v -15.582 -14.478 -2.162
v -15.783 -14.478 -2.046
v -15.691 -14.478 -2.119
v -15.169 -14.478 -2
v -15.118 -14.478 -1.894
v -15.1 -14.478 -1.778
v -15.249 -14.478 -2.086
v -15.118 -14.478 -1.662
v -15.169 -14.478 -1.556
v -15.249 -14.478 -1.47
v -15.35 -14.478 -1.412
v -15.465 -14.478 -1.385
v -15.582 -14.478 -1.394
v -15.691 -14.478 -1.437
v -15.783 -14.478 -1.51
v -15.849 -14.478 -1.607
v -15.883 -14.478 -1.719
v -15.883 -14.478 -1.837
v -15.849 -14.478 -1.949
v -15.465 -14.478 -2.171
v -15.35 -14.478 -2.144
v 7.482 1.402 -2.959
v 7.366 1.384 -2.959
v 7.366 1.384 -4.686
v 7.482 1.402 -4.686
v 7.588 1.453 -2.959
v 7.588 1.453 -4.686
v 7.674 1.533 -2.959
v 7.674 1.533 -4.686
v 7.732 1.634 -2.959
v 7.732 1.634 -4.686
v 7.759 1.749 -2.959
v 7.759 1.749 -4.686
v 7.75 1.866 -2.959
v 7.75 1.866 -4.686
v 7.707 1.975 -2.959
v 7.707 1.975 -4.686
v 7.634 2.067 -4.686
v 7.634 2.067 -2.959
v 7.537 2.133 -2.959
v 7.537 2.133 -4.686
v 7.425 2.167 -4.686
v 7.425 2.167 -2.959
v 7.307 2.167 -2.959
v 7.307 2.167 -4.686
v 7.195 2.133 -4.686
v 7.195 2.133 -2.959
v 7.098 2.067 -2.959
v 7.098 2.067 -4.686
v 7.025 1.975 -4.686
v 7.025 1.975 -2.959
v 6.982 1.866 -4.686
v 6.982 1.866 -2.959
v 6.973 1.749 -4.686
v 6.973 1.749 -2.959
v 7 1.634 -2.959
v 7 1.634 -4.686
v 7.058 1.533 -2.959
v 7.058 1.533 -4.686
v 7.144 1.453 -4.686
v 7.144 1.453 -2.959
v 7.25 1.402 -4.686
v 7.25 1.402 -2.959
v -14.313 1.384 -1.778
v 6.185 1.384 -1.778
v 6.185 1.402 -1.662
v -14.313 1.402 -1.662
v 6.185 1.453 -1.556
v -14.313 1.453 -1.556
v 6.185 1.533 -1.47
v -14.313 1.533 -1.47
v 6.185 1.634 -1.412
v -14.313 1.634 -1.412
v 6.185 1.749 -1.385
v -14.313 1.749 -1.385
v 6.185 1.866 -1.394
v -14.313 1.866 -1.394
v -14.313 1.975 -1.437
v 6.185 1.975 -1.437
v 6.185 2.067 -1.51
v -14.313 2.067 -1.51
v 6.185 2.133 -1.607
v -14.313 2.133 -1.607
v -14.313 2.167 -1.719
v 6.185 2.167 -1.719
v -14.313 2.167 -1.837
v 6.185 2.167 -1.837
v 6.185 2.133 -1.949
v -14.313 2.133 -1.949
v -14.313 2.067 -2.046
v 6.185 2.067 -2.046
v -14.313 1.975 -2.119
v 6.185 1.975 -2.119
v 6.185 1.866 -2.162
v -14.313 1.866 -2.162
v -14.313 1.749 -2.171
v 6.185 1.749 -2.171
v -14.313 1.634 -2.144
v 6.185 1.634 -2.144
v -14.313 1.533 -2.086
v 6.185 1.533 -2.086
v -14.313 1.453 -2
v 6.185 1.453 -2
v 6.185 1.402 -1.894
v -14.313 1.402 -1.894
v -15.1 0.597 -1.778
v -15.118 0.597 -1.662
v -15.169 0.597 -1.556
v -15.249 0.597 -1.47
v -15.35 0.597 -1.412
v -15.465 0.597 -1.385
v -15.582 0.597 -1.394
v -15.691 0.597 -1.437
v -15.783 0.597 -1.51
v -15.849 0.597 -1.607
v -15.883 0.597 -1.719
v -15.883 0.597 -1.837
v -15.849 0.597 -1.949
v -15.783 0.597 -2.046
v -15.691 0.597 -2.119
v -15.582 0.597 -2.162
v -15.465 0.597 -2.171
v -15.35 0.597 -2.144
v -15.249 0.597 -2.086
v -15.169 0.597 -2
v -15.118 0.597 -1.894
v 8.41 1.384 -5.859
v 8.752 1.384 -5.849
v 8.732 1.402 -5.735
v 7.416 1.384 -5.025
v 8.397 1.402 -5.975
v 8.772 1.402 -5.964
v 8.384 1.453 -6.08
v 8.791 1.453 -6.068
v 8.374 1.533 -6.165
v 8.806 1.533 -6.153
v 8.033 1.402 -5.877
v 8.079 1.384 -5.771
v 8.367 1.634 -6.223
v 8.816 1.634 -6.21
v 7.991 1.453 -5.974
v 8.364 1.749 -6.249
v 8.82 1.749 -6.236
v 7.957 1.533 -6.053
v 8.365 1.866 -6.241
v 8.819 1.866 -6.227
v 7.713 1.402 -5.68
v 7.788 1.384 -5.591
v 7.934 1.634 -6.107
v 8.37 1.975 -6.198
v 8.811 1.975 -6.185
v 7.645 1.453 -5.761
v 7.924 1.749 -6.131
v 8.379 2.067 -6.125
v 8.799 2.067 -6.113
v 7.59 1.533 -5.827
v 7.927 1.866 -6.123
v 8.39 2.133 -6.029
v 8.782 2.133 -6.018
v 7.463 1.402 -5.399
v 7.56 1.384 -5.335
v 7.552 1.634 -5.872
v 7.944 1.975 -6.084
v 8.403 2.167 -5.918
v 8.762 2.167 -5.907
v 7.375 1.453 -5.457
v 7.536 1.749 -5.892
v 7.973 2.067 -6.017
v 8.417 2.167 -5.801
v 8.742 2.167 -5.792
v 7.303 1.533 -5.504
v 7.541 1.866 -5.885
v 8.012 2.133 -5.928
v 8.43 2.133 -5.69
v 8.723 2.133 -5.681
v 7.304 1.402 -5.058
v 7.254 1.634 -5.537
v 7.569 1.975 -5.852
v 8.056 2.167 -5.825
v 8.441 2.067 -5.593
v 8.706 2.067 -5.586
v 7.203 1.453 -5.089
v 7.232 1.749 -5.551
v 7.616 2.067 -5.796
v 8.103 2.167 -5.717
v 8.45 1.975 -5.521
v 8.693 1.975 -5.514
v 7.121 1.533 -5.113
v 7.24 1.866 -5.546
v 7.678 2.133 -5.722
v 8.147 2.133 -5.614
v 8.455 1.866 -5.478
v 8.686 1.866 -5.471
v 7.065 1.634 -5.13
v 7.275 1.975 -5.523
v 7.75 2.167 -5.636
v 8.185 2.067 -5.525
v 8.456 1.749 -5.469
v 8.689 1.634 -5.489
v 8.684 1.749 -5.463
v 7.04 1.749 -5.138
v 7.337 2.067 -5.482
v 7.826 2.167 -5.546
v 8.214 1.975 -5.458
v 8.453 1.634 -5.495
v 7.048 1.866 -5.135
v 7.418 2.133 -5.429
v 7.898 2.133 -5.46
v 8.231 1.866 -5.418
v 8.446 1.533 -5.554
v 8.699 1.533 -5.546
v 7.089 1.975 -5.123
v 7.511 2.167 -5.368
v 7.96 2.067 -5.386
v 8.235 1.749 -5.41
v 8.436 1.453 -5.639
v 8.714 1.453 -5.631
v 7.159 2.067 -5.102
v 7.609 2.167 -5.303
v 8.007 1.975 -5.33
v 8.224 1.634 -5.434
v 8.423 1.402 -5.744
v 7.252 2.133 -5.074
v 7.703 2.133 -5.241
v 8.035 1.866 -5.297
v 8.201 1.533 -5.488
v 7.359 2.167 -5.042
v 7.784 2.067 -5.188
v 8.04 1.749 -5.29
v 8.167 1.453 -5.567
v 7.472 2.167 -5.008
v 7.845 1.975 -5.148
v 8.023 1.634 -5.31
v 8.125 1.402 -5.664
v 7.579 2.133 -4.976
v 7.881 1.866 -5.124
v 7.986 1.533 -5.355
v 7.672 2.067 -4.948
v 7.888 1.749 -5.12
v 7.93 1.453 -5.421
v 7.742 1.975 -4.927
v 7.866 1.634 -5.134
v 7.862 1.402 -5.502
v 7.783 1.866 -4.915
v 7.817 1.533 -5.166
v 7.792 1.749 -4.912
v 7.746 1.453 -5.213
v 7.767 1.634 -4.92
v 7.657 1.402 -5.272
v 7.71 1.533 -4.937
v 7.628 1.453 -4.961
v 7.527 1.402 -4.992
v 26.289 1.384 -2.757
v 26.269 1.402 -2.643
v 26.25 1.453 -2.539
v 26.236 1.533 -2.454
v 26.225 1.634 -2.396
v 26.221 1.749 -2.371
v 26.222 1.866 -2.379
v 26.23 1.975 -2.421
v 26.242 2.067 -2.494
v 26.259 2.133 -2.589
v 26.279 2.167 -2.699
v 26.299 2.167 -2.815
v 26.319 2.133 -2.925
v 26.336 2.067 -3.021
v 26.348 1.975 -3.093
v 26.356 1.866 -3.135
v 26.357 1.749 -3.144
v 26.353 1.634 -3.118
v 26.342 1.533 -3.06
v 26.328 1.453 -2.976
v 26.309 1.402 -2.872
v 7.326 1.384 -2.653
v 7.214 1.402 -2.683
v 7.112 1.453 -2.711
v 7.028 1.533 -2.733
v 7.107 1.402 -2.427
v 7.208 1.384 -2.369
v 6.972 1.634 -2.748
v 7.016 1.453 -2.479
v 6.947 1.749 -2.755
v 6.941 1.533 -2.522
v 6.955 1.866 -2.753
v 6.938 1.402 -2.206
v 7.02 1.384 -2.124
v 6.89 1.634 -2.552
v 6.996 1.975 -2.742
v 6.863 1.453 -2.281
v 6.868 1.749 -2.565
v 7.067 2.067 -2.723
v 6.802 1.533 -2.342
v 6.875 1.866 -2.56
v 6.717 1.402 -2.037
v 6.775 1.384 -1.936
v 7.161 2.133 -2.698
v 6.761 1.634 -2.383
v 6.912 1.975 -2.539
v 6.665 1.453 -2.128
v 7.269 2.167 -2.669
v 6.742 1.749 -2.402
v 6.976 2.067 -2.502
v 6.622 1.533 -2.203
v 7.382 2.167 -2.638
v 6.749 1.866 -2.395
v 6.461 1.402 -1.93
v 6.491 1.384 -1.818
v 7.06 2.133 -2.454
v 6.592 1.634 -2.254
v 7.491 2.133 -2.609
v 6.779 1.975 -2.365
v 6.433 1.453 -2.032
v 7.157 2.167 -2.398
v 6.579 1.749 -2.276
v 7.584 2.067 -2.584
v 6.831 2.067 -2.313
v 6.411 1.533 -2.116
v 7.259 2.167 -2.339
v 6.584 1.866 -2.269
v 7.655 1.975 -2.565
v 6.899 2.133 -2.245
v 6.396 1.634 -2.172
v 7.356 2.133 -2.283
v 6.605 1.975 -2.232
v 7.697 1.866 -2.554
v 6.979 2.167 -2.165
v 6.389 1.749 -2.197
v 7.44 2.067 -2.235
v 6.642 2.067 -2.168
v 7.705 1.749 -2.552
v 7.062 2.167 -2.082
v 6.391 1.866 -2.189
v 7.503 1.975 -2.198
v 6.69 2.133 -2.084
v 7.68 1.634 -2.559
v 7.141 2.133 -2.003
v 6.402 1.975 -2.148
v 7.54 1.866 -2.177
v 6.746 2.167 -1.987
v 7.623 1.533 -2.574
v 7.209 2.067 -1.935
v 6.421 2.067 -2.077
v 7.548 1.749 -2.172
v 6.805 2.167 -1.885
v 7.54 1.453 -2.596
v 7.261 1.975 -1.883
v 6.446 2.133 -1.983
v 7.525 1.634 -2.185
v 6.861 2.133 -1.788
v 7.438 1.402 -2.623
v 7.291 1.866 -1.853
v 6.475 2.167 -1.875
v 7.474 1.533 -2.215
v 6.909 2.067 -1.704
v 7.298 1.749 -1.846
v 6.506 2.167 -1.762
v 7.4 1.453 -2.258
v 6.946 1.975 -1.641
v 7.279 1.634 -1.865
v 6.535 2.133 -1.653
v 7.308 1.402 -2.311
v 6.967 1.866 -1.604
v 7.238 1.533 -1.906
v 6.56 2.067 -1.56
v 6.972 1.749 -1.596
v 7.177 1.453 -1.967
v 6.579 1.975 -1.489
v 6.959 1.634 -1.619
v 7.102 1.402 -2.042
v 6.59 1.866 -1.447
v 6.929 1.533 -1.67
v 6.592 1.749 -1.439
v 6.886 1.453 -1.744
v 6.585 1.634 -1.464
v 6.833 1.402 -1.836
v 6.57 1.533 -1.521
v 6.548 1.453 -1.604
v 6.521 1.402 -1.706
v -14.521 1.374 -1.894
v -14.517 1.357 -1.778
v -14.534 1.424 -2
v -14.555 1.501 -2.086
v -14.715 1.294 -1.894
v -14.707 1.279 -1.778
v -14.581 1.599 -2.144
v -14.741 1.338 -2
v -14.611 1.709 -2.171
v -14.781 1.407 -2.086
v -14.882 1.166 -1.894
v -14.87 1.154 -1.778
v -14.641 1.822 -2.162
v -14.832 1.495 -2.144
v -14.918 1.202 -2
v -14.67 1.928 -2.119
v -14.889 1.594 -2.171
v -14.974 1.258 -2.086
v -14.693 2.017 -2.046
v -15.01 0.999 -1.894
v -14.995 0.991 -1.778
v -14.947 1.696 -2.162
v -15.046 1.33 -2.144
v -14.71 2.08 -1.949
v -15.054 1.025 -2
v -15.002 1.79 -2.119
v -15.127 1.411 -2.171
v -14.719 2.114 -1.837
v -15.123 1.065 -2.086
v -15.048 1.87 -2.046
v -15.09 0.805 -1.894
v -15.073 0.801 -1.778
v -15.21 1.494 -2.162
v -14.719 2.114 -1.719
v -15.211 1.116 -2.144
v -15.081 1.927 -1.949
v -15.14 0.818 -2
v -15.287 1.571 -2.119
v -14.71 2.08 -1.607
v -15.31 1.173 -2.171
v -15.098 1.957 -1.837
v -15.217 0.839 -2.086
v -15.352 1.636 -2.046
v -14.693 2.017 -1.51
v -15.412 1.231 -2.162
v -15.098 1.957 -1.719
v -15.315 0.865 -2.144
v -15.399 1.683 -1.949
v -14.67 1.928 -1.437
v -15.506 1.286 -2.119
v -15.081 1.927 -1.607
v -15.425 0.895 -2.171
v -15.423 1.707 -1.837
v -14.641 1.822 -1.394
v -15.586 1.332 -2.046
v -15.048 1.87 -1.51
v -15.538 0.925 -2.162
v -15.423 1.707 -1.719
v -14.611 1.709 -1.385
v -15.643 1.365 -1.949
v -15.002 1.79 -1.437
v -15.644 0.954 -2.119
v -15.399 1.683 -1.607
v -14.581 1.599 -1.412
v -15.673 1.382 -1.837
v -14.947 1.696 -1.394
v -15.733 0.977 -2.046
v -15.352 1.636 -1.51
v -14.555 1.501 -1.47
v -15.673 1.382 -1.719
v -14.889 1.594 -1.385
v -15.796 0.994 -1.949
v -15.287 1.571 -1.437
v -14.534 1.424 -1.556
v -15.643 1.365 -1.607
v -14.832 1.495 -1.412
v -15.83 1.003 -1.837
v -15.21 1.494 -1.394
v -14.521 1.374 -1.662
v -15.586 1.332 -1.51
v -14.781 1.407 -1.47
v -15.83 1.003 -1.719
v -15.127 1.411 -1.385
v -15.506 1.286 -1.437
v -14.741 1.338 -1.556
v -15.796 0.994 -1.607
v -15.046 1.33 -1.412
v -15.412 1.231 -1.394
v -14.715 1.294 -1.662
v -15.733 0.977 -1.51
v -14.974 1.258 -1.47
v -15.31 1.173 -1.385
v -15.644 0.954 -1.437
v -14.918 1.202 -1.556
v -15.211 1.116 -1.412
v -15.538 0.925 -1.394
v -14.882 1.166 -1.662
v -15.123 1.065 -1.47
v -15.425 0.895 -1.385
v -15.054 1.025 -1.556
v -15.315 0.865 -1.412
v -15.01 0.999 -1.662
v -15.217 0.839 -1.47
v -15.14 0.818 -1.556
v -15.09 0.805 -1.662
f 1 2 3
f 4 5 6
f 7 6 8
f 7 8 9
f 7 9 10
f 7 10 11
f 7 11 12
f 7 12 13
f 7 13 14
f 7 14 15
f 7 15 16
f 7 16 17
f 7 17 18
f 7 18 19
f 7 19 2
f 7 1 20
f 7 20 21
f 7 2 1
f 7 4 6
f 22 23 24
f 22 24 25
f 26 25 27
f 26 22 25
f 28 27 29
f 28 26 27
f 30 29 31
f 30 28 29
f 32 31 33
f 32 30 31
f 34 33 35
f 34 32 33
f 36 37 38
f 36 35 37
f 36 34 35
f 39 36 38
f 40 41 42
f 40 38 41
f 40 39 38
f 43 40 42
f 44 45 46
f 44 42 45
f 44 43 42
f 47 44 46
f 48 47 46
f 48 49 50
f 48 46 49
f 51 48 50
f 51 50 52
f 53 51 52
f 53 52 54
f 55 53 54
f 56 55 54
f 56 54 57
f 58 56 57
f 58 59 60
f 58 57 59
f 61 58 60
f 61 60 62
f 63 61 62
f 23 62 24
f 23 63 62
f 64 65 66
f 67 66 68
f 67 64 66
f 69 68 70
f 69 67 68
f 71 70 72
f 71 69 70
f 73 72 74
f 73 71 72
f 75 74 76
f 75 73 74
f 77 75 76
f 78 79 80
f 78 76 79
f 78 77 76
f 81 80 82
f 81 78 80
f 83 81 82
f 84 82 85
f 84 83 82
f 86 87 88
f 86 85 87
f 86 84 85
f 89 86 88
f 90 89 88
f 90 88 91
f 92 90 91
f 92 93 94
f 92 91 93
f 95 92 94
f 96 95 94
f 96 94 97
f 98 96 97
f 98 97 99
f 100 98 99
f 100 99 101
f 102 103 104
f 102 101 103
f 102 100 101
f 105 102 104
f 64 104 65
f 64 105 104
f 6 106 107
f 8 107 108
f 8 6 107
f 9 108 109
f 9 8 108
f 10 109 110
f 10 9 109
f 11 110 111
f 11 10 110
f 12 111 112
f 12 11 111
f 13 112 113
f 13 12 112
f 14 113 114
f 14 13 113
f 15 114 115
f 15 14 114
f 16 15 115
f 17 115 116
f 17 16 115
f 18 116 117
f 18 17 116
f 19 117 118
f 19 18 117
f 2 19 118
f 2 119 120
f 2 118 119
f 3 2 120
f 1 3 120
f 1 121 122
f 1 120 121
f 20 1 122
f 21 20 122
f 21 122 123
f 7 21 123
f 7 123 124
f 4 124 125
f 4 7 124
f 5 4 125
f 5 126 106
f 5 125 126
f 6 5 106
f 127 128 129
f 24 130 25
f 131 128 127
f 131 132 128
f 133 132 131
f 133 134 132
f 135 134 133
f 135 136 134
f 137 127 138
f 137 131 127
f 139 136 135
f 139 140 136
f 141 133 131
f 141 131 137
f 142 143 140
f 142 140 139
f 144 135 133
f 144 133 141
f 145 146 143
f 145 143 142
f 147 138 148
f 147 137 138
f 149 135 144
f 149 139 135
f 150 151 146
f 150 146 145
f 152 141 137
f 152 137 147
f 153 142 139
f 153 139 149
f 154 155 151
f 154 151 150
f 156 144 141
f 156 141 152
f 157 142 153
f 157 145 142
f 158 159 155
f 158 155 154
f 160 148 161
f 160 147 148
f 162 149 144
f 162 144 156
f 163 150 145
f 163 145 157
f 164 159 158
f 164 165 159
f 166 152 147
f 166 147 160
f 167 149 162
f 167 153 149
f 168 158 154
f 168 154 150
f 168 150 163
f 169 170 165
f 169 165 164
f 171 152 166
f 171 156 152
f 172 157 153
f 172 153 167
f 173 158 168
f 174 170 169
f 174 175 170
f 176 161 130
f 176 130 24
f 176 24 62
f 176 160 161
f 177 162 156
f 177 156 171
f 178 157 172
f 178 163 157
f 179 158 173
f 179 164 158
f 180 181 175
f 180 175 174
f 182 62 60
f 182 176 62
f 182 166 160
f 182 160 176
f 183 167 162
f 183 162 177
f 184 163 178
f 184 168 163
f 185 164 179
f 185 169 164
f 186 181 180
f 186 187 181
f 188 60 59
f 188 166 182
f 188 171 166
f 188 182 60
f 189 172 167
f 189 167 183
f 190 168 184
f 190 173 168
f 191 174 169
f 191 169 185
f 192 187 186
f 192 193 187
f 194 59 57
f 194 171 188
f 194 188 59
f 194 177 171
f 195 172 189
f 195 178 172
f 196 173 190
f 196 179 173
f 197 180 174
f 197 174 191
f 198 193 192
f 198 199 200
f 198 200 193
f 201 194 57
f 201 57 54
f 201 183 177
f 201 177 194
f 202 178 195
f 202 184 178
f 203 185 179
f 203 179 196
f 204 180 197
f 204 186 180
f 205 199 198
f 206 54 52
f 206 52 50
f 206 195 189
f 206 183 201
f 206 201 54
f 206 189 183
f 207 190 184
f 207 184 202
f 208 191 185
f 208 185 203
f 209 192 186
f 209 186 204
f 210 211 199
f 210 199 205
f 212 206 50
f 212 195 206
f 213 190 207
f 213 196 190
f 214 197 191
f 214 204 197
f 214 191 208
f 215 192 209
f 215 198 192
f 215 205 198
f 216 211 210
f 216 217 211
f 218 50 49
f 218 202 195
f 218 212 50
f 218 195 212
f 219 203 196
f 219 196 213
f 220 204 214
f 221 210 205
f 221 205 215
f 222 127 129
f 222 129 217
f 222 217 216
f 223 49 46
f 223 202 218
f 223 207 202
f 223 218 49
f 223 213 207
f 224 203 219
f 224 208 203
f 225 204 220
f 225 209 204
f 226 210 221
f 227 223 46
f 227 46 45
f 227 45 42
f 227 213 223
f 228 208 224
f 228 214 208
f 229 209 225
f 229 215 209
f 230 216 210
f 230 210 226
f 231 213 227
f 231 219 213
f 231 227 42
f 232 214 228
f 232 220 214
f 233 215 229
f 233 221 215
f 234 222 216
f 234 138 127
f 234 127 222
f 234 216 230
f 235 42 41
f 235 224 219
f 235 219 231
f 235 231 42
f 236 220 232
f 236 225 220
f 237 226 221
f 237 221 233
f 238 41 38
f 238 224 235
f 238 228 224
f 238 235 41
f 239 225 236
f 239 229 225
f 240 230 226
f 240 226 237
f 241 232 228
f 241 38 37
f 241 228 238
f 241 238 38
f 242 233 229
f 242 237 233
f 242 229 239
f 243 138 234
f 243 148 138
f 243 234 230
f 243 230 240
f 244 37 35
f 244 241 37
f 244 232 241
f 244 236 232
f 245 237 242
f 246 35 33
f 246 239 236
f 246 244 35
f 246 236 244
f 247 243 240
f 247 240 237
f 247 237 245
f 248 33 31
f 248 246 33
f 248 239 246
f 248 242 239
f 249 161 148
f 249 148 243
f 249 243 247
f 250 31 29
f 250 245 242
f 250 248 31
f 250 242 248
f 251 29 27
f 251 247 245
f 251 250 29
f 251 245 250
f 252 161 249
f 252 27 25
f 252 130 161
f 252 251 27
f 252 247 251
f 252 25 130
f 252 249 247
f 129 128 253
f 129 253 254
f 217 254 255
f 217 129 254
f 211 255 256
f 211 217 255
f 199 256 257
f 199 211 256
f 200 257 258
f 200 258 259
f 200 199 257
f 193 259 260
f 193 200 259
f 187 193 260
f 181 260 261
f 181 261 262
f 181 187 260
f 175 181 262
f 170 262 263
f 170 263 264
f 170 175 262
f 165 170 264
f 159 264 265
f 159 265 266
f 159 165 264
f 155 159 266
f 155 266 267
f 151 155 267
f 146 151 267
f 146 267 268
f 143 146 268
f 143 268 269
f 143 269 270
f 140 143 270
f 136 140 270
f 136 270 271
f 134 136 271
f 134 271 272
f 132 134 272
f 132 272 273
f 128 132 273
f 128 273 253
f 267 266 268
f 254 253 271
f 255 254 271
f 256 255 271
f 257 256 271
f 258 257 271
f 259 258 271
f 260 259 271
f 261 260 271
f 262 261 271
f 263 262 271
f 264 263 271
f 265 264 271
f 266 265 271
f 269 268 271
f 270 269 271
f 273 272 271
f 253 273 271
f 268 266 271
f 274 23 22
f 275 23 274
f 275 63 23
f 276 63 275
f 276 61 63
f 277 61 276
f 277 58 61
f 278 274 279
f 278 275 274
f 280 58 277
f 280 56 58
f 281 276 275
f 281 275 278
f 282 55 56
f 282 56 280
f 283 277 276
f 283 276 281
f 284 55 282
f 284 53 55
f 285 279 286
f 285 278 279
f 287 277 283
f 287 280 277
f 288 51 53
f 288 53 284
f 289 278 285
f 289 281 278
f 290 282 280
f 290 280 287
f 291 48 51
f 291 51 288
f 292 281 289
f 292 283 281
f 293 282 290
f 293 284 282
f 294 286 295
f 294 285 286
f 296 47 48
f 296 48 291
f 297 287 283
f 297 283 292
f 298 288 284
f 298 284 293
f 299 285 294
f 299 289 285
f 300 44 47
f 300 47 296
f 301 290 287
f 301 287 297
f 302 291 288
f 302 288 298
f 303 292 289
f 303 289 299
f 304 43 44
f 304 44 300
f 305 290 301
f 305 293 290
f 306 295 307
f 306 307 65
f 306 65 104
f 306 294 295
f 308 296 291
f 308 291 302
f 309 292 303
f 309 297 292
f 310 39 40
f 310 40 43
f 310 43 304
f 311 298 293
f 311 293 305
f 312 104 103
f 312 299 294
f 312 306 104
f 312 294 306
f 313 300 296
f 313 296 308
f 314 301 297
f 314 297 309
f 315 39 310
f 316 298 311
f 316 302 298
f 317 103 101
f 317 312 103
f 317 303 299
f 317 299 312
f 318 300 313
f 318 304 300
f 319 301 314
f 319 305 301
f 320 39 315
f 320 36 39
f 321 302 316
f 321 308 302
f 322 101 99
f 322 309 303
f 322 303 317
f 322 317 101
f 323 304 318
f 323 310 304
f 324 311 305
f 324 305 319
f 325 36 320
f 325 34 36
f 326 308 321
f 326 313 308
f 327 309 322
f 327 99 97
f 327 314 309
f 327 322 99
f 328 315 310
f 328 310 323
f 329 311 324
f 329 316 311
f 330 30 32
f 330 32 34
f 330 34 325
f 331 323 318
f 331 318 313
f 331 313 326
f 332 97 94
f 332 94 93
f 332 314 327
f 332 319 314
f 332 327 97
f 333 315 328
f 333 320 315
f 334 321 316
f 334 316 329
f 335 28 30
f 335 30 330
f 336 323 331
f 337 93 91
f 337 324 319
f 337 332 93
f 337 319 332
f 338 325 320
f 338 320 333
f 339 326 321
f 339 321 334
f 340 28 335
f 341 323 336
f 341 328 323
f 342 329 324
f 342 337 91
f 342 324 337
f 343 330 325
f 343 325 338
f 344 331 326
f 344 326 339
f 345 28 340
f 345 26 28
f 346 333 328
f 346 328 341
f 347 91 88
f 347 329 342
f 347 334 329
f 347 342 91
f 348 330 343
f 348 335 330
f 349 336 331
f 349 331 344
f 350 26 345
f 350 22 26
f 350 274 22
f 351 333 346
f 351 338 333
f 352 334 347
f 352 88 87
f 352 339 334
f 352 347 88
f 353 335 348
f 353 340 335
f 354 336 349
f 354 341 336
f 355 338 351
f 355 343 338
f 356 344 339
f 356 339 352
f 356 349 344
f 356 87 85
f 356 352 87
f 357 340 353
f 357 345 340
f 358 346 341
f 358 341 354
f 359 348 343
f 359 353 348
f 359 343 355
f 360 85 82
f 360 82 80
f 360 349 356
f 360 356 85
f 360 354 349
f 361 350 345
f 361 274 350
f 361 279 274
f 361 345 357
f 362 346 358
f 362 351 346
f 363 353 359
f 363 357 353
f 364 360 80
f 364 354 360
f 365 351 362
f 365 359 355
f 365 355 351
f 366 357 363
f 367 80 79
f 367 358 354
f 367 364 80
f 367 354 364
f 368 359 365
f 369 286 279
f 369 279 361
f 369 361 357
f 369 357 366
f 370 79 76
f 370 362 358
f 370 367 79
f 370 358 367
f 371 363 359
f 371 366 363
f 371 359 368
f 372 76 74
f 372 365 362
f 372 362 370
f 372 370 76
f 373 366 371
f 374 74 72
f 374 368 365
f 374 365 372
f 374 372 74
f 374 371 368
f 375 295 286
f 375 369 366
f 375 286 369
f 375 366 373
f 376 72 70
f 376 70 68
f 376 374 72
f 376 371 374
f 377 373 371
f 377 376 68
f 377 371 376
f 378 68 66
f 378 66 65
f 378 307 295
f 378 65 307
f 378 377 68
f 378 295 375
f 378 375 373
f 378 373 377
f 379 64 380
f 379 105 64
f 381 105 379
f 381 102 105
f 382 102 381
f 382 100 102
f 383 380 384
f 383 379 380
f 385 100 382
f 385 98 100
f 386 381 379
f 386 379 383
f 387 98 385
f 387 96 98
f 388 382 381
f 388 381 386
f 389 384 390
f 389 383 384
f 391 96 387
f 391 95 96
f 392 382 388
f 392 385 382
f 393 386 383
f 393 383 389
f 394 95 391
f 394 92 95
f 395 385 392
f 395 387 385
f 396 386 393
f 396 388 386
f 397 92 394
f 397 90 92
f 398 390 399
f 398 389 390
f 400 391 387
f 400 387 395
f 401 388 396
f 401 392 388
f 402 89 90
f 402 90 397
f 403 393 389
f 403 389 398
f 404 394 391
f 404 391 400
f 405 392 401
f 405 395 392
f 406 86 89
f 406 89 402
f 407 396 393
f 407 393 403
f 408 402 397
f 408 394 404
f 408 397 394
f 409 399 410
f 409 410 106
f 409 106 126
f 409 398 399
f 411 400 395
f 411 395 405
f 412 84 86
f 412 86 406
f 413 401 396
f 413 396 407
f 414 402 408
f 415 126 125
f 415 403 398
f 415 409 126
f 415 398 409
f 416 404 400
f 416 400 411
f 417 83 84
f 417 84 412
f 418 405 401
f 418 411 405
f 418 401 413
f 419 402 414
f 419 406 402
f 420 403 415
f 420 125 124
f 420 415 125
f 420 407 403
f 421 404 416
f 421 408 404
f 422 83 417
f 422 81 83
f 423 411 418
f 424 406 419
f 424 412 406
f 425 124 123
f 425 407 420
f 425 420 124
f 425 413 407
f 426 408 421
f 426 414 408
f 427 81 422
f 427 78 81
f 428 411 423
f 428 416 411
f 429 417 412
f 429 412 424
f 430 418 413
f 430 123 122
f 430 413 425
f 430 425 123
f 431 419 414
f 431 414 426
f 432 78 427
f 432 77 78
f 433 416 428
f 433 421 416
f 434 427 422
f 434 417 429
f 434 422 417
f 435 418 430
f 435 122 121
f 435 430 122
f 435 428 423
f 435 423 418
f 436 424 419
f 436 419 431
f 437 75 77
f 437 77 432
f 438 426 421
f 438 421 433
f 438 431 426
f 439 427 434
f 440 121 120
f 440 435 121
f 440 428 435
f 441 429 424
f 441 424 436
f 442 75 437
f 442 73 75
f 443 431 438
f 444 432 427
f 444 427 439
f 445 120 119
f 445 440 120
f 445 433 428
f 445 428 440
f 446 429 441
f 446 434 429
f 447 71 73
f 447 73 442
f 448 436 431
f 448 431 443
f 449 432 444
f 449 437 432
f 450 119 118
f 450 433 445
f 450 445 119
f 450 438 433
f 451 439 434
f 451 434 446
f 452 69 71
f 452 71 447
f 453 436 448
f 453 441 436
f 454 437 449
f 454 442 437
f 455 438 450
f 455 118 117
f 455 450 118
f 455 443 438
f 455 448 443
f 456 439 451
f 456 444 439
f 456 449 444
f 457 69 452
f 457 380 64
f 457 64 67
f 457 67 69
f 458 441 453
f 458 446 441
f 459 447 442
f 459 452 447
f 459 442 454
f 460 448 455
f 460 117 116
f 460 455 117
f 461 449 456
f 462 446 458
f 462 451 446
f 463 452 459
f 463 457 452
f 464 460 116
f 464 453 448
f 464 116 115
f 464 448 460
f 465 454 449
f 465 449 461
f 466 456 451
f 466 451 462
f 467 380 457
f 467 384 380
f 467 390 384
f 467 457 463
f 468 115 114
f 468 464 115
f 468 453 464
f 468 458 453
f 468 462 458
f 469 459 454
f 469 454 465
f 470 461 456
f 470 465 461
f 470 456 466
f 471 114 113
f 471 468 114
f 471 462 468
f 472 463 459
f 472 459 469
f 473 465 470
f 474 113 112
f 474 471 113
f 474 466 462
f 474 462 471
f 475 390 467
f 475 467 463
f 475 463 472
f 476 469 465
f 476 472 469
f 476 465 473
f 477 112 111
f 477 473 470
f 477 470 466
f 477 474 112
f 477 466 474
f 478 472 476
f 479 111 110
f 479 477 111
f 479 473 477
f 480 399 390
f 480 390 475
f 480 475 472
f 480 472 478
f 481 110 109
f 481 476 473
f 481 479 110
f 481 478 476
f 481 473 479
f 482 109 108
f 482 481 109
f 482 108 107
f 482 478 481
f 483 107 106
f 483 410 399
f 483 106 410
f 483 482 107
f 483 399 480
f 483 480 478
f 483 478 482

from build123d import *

# Parameters (mm, degrees)
SKETCH3_R = 0.3937


with BuildPart() as part:
    # Sweep3: sweep along a curve in space
    with BuildLine() as sweep3_path:
        Line((-15.494, 0.5969, -1.778), (-15.494, -14.478, -1.778))
        ThreePointArc((-14.3129, 1.778, -1.778), (-15.148063819, 1.432063819, -1.778), (-15.494, 0.5969, -1.778))
        Line((6.1849, 1.778, -1.778), (-14.3129, 1.778, -1.778))
        ThreePointArc((7.366, 1.778, -2.9591), (7.020063819, 1.778, -2.123936181), (6.1849, 1.778, -1.778))
        Line((7.366, 1.778, -2.9591), (7.366, 1.778, -4.6863))
        ThreePointArc((8.752195863, 1.778, -5.849456437), (7.787903554, 1.778, -5.591075092), (7.366, 1.778, -4.6863))
        Line((8.752195863, 1.778, -5.849456437), (26.289, 1.778, -2.757244712))
    # Sketch3 → Sweep3 (sweep)
    with BuildSketch(Plane(origin=(-15.494, -14.478, -1.778), x_dir=(1, 0, 0), z_dir=(0, -1, 0))):
        Circle(SKETCH3_R)
    sweep(path=sweep3_path.line)


solid = part.part
